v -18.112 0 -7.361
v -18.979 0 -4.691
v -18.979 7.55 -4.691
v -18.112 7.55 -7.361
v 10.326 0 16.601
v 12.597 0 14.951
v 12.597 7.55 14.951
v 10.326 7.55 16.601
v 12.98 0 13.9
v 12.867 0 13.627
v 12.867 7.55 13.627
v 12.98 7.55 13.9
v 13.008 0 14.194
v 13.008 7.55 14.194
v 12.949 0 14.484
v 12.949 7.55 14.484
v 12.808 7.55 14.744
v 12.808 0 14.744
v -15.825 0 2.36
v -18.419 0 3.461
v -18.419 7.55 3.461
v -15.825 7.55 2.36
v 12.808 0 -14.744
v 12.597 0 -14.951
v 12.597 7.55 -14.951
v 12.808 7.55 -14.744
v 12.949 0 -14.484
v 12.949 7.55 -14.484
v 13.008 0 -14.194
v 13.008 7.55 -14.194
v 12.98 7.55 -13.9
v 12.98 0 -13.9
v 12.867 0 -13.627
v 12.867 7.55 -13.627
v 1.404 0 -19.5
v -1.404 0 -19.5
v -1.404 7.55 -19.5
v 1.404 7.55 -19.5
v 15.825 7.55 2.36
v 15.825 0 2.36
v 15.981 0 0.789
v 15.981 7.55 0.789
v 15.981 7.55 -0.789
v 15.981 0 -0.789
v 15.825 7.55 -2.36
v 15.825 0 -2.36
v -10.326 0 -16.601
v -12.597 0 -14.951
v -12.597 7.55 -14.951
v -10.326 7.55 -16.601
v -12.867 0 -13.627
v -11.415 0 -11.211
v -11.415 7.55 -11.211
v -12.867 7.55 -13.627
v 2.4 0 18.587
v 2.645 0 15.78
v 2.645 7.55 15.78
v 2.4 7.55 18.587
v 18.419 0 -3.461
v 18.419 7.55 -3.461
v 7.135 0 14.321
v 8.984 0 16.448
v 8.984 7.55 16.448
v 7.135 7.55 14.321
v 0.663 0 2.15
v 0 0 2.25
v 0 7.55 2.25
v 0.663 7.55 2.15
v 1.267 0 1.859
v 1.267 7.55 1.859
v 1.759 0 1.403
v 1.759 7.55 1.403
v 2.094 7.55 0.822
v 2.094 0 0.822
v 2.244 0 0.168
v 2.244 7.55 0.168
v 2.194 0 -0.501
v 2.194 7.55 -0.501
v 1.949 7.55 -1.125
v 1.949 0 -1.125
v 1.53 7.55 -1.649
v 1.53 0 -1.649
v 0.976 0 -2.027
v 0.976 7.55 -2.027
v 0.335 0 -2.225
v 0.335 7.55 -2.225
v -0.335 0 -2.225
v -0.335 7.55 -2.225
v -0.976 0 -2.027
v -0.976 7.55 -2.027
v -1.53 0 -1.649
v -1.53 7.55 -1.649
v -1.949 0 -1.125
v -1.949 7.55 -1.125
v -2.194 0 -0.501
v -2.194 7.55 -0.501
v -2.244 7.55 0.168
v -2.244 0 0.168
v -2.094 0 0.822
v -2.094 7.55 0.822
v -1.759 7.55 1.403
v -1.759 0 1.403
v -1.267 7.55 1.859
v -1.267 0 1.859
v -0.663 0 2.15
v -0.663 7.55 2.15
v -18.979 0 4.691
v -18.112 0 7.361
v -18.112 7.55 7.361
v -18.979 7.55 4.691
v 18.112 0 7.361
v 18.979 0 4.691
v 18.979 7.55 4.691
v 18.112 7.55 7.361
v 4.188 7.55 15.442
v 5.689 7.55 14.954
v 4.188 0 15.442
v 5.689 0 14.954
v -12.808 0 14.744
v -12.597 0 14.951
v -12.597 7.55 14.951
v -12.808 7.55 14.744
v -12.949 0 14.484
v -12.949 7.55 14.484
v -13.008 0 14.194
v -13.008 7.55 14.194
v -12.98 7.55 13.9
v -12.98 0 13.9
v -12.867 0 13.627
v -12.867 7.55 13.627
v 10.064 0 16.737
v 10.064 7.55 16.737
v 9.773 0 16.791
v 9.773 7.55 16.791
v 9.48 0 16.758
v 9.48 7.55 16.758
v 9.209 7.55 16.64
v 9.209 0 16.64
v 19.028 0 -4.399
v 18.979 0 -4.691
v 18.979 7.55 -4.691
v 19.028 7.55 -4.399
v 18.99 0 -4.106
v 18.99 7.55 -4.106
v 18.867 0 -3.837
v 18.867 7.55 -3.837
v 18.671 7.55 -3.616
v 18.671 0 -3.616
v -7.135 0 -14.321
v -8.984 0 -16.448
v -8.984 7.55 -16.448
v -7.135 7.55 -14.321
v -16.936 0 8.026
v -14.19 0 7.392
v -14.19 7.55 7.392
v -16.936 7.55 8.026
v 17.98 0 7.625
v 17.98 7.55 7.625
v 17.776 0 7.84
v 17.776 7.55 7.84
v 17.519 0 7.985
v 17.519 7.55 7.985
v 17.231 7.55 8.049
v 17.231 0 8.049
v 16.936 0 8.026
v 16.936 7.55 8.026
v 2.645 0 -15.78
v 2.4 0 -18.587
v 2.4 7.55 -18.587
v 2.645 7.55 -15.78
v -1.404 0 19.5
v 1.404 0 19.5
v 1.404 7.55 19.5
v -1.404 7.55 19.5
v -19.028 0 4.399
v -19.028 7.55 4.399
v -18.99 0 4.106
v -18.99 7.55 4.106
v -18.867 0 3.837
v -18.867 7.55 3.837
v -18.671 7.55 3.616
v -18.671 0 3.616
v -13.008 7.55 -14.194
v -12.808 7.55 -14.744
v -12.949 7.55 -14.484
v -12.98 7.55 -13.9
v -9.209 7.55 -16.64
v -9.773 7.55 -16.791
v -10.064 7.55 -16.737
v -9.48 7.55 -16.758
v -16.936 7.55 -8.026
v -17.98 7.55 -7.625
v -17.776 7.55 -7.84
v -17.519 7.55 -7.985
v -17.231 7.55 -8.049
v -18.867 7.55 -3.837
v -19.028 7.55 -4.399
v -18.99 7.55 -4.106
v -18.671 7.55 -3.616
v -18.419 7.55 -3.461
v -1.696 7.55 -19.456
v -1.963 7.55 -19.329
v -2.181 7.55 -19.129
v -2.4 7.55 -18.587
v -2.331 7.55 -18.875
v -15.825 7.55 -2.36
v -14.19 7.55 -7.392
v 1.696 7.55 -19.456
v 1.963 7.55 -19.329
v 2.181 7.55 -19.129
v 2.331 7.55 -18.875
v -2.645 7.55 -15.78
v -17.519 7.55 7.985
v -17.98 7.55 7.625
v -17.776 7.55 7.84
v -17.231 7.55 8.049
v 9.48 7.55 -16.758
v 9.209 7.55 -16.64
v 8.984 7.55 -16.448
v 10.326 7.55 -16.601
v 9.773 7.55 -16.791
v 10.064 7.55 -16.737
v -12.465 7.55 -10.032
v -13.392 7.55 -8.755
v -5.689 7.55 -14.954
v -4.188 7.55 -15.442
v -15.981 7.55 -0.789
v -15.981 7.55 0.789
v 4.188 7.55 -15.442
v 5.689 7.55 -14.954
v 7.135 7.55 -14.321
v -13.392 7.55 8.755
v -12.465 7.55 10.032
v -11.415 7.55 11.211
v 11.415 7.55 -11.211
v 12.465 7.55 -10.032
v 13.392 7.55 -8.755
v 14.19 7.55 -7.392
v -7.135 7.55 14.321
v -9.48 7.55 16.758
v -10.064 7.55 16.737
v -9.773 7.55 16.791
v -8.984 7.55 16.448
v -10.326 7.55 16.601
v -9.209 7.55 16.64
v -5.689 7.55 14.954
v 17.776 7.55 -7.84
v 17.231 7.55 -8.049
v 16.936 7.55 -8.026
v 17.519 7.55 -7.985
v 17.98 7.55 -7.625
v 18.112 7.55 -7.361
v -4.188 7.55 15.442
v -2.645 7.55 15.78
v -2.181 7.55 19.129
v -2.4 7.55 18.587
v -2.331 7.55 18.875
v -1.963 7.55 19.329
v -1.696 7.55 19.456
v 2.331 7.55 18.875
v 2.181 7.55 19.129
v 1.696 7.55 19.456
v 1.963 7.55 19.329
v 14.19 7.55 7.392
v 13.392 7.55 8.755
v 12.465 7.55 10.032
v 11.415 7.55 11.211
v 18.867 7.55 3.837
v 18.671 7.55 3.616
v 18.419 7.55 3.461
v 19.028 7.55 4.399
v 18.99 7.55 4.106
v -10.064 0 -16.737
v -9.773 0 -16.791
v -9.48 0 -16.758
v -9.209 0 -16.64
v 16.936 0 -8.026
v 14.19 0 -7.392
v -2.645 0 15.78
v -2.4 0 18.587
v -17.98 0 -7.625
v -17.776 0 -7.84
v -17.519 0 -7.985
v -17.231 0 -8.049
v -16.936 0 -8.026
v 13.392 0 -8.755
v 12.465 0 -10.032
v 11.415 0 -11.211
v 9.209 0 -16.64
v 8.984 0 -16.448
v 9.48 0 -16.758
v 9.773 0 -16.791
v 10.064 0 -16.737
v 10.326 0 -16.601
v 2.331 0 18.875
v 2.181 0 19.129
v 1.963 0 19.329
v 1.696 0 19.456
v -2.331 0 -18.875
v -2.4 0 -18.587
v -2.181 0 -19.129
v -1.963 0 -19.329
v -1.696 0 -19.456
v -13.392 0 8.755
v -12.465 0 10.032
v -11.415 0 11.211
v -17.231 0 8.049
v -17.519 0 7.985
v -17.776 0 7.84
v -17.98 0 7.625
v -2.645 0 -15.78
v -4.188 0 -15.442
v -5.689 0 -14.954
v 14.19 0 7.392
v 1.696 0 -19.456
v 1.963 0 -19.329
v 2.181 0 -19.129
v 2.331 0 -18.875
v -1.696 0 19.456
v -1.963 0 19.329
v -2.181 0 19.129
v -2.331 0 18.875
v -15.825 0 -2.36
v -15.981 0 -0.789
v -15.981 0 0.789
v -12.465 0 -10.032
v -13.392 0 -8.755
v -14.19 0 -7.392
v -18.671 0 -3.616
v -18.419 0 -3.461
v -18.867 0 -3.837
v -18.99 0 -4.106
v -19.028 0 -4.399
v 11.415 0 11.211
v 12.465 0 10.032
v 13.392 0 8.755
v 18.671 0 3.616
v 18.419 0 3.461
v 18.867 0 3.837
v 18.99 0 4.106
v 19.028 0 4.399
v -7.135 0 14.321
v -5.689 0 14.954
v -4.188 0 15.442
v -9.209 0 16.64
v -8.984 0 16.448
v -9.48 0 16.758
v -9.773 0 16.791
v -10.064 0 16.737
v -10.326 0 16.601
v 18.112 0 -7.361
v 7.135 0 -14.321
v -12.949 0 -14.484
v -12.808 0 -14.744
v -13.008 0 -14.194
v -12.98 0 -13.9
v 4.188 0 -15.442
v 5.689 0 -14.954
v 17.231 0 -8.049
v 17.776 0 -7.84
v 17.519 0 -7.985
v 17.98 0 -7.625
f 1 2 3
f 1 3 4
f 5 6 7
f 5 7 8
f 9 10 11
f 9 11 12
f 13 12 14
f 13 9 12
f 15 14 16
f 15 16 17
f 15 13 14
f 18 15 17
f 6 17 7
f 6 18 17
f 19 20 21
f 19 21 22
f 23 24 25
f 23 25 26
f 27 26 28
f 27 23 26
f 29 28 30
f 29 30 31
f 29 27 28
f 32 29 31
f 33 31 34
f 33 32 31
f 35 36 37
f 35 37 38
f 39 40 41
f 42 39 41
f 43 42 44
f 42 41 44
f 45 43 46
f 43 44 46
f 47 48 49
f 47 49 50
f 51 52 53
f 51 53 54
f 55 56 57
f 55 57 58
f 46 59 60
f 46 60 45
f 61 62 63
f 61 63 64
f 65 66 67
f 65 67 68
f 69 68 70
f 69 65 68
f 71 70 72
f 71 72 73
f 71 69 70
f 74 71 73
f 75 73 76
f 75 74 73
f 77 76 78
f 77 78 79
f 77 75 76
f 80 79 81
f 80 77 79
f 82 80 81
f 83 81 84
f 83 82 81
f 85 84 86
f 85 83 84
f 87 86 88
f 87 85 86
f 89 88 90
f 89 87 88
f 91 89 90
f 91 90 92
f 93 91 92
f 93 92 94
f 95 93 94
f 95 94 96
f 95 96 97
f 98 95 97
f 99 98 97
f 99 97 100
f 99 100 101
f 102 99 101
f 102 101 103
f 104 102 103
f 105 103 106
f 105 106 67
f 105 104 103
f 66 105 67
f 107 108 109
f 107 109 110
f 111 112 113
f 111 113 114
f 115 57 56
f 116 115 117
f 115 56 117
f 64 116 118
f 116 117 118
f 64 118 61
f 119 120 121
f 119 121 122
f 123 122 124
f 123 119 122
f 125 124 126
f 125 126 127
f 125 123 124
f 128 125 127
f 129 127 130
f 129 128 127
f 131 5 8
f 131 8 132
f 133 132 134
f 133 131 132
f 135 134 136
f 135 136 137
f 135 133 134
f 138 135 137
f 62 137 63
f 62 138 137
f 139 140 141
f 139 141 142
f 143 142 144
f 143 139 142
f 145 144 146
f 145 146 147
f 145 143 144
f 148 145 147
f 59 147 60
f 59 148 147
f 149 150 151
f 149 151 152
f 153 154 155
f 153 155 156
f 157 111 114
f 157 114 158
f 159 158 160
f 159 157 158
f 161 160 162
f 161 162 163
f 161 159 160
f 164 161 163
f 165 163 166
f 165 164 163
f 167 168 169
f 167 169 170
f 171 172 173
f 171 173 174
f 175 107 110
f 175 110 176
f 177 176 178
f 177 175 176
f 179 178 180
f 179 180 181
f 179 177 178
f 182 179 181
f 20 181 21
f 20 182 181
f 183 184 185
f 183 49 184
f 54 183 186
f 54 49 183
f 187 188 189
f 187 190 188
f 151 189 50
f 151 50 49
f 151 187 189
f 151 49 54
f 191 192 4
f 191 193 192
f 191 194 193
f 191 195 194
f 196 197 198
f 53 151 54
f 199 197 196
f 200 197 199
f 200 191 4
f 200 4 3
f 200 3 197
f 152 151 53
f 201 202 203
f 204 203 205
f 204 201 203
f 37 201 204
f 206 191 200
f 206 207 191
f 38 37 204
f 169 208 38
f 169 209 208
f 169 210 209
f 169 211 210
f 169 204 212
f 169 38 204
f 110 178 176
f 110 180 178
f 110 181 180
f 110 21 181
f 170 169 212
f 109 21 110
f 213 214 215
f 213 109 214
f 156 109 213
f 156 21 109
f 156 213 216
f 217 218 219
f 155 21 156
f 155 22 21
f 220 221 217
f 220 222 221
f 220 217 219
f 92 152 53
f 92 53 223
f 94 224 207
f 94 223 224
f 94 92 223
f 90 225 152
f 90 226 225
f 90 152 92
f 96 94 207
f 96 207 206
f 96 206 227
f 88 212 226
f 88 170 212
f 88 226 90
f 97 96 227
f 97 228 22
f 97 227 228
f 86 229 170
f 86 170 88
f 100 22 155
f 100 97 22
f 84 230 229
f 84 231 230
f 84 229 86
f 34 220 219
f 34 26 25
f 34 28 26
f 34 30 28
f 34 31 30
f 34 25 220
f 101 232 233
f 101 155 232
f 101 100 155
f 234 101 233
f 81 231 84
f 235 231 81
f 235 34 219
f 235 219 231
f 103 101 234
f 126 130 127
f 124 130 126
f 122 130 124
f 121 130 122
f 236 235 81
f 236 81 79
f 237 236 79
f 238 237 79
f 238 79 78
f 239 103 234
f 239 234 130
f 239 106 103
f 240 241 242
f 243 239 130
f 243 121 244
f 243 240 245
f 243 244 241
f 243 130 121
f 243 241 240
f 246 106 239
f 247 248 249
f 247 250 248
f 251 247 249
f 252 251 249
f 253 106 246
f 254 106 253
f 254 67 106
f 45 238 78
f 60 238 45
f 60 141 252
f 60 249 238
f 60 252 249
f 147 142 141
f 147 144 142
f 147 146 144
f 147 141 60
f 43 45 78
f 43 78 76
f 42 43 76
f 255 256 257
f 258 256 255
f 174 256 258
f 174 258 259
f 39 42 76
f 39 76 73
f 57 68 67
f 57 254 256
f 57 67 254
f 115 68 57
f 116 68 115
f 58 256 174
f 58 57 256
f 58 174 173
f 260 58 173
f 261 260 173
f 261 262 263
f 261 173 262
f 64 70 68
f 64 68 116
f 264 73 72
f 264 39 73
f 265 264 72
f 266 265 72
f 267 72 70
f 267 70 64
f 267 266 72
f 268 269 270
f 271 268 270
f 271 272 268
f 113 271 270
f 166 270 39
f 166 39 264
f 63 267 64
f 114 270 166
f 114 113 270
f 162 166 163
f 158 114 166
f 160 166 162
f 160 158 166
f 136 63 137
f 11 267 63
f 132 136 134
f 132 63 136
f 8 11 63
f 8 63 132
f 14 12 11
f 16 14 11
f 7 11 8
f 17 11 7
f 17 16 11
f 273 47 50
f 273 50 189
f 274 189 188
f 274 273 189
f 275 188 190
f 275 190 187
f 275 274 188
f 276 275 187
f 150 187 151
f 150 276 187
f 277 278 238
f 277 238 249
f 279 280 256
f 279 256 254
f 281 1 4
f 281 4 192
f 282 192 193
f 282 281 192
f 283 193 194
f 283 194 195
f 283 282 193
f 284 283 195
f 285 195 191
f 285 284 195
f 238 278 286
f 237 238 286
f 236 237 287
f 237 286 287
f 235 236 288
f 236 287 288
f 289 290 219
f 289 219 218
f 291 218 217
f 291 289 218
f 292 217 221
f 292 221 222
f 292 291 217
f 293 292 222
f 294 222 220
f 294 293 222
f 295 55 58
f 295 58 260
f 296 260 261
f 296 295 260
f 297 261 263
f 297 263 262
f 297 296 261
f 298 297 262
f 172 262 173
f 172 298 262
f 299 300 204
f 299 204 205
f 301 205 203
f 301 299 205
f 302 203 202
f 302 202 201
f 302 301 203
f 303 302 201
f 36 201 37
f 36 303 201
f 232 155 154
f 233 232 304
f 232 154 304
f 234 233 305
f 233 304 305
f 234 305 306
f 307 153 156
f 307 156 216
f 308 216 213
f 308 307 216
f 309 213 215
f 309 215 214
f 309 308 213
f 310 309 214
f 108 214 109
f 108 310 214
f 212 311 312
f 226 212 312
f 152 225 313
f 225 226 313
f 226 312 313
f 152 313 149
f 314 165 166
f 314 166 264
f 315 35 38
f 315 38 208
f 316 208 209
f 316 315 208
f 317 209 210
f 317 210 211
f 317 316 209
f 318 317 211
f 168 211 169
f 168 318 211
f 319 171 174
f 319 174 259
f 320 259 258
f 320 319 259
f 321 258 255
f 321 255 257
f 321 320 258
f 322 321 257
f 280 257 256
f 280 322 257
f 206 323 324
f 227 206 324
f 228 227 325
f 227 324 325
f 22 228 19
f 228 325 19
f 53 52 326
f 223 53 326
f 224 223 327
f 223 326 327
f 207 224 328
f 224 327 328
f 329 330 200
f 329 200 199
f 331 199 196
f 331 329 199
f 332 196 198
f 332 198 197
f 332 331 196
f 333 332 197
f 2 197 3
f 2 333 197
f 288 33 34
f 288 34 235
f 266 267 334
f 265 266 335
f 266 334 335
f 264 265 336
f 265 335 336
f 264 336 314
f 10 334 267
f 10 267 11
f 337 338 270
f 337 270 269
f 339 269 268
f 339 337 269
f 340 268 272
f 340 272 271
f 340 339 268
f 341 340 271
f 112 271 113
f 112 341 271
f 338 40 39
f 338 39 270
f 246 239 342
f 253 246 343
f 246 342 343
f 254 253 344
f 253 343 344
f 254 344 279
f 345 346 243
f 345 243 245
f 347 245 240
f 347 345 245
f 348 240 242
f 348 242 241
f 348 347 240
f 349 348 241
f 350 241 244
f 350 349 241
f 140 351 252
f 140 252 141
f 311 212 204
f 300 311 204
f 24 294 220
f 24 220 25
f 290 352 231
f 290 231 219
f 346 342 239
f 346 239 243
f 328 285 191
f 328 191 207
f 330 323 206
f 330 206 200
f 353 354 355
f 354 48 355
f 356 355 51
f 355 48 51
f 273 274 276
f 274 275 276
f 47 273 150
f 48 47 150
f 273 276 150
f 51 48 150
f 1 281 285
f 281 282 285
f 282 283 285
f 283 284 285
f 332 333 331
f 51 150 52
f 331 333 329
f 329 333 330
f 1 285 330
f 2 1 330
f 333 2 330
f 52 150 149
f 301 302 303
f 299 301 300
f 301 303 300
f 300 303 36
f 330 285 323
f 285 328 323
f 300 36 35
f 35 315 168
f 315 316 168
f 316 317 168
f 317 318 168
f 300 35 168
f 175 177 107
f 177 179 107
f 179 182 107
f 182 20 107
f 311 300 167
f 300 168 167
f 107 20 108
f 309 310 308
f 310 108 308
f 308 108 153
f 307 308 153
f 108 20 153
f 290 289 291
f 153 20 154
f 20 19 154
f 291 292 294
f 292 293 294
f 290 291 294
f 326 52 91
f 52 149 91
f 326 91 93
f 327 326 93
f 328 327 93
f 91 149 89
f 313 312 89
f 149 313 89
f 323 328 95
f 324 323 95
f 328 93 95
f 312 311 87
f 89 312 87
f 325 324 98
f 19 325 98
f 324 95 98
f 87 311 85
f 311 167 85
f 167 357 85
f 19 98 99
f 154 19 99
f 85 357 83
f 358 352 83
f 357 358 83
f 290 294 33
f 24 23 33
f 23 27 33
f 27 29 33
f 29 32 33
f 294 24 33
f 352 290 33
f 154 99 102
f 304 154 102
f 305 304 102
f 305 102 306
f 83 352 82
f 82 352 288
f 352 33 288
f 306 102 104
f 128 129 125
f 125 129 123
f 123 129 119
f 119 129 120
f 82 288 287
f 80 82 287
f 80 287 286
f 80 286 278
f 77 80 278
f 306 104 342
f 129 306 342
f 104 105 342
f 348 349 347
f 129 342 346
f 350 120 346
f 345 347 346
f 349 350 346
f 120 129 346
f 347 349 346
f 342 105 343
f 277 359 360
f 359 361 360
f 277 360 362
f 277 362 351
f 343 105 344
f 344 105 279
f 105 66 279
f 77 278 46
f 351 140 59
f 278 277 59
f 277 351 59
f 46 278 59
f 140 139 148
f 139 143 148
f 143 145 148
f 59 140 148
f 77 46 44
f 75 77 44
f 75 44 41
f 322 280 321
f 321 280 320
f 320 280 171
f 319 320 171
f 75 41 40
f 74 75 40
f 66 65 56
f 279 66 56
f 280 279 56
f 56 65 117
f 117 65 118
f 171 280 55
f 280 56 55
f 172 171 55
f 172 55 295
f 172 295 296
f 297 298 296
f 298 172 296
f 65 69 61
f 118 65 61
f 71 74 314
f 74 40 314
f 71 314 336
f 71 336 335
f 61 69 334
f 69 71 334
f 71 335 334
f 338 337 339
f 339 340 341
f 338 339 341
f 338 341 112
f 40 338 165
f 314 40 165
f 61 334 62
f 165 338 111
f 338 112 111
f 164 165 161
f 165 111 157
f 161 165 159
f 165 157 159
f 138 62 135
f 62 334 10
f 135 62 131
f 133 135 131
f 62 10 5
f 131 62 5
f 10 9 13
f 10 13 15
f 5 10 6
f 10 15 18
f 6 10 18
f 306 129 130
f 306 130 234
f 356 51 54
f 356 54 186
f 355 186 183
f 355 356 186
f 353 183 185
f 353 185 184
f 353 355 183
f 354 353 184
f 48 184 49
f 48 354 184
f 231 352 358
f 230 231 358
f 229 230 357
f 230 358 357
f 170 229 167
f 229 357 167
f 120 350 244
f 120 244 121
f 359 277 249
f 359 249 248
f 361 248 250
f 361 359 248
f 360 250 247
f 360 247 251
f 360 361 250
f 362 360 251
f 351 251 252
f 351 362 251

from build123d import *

# Parameters (mm, degrees)
SKETCH1_R           = 16
SKETCH1_R_2         = 2.25
BOSS_EXTRUDE1_DEPTH = 7.55
BOSS_EXTRUDE2_START = -7.55
BOSS_EXTRUDE2_DEPTH = 7.55
CIRPATTERN1_COUNT   = 10


with BuildPart() as part:
    # Sketch1 → Boss-Extrude1 (new body)
    with BuildSketch(Plane(origin=(0, 0, 0), x_dir=(1, 0, 0), z_dir=(0, 1, 0))):
        with Locations(Location((0, 0, 0), (0, 0, 270))):
            Circle(SKETCH1_R)
        with Locations(Location((0, 0, 0), (0, 0, 270))):
            Circle(SKETCH1_R_2, mode=Mode.SUBTRACT)
    extrude(amount=BOSS_EXTRUDE1_DEPTH)

    # Sketch2 → Boss-Extrude2 (add)
    with BuildSketch(Plane(origin=(0, 7.55, 0), x_dir=(1, 0, 0), z_dir=(0, 1, 0)).offset(BOSS_EXTRUDE2_START)):
        with BuildLine():
            Line((-1.403668826, 19.5), (1.403668826, 19.5))
            ThreePointArc((1.403668826, 19.5), (2.079259034, 19.237277337), (2.399863524, 18.587155743))
            Line((2.399863524, 18.587155743), (2.645477092, 15.779779813))
            ThreePointArc((2.645477092, 15.779779813), (0, 16), (-2.645477092, 15.779779813))
            Line((-2.645477092, 15.779779813), (-2.399863524, 18.587155743))
            ThreePointArc((-2.399863524, 18.587155743), (-2.079259034, 19.237277337), (-1.403668826, 19.5))
        make_face()
    boss_extrude2 = extrude(amount=BOSS_EXTRUDE2_DEPTH)

    # CirPattern1: Boss-Extrude2 ×10 about axis
    cirpattern1_axis = Axis((0, 0, 0), (0, 1, 0))
    for i in range(1, CIRPATTERN1_COUNT):
        add(boss_extrude2.rotate(cirpattern1_axis, i * 360 / CIRPATTERN1_COUNT))


solid = part.part
